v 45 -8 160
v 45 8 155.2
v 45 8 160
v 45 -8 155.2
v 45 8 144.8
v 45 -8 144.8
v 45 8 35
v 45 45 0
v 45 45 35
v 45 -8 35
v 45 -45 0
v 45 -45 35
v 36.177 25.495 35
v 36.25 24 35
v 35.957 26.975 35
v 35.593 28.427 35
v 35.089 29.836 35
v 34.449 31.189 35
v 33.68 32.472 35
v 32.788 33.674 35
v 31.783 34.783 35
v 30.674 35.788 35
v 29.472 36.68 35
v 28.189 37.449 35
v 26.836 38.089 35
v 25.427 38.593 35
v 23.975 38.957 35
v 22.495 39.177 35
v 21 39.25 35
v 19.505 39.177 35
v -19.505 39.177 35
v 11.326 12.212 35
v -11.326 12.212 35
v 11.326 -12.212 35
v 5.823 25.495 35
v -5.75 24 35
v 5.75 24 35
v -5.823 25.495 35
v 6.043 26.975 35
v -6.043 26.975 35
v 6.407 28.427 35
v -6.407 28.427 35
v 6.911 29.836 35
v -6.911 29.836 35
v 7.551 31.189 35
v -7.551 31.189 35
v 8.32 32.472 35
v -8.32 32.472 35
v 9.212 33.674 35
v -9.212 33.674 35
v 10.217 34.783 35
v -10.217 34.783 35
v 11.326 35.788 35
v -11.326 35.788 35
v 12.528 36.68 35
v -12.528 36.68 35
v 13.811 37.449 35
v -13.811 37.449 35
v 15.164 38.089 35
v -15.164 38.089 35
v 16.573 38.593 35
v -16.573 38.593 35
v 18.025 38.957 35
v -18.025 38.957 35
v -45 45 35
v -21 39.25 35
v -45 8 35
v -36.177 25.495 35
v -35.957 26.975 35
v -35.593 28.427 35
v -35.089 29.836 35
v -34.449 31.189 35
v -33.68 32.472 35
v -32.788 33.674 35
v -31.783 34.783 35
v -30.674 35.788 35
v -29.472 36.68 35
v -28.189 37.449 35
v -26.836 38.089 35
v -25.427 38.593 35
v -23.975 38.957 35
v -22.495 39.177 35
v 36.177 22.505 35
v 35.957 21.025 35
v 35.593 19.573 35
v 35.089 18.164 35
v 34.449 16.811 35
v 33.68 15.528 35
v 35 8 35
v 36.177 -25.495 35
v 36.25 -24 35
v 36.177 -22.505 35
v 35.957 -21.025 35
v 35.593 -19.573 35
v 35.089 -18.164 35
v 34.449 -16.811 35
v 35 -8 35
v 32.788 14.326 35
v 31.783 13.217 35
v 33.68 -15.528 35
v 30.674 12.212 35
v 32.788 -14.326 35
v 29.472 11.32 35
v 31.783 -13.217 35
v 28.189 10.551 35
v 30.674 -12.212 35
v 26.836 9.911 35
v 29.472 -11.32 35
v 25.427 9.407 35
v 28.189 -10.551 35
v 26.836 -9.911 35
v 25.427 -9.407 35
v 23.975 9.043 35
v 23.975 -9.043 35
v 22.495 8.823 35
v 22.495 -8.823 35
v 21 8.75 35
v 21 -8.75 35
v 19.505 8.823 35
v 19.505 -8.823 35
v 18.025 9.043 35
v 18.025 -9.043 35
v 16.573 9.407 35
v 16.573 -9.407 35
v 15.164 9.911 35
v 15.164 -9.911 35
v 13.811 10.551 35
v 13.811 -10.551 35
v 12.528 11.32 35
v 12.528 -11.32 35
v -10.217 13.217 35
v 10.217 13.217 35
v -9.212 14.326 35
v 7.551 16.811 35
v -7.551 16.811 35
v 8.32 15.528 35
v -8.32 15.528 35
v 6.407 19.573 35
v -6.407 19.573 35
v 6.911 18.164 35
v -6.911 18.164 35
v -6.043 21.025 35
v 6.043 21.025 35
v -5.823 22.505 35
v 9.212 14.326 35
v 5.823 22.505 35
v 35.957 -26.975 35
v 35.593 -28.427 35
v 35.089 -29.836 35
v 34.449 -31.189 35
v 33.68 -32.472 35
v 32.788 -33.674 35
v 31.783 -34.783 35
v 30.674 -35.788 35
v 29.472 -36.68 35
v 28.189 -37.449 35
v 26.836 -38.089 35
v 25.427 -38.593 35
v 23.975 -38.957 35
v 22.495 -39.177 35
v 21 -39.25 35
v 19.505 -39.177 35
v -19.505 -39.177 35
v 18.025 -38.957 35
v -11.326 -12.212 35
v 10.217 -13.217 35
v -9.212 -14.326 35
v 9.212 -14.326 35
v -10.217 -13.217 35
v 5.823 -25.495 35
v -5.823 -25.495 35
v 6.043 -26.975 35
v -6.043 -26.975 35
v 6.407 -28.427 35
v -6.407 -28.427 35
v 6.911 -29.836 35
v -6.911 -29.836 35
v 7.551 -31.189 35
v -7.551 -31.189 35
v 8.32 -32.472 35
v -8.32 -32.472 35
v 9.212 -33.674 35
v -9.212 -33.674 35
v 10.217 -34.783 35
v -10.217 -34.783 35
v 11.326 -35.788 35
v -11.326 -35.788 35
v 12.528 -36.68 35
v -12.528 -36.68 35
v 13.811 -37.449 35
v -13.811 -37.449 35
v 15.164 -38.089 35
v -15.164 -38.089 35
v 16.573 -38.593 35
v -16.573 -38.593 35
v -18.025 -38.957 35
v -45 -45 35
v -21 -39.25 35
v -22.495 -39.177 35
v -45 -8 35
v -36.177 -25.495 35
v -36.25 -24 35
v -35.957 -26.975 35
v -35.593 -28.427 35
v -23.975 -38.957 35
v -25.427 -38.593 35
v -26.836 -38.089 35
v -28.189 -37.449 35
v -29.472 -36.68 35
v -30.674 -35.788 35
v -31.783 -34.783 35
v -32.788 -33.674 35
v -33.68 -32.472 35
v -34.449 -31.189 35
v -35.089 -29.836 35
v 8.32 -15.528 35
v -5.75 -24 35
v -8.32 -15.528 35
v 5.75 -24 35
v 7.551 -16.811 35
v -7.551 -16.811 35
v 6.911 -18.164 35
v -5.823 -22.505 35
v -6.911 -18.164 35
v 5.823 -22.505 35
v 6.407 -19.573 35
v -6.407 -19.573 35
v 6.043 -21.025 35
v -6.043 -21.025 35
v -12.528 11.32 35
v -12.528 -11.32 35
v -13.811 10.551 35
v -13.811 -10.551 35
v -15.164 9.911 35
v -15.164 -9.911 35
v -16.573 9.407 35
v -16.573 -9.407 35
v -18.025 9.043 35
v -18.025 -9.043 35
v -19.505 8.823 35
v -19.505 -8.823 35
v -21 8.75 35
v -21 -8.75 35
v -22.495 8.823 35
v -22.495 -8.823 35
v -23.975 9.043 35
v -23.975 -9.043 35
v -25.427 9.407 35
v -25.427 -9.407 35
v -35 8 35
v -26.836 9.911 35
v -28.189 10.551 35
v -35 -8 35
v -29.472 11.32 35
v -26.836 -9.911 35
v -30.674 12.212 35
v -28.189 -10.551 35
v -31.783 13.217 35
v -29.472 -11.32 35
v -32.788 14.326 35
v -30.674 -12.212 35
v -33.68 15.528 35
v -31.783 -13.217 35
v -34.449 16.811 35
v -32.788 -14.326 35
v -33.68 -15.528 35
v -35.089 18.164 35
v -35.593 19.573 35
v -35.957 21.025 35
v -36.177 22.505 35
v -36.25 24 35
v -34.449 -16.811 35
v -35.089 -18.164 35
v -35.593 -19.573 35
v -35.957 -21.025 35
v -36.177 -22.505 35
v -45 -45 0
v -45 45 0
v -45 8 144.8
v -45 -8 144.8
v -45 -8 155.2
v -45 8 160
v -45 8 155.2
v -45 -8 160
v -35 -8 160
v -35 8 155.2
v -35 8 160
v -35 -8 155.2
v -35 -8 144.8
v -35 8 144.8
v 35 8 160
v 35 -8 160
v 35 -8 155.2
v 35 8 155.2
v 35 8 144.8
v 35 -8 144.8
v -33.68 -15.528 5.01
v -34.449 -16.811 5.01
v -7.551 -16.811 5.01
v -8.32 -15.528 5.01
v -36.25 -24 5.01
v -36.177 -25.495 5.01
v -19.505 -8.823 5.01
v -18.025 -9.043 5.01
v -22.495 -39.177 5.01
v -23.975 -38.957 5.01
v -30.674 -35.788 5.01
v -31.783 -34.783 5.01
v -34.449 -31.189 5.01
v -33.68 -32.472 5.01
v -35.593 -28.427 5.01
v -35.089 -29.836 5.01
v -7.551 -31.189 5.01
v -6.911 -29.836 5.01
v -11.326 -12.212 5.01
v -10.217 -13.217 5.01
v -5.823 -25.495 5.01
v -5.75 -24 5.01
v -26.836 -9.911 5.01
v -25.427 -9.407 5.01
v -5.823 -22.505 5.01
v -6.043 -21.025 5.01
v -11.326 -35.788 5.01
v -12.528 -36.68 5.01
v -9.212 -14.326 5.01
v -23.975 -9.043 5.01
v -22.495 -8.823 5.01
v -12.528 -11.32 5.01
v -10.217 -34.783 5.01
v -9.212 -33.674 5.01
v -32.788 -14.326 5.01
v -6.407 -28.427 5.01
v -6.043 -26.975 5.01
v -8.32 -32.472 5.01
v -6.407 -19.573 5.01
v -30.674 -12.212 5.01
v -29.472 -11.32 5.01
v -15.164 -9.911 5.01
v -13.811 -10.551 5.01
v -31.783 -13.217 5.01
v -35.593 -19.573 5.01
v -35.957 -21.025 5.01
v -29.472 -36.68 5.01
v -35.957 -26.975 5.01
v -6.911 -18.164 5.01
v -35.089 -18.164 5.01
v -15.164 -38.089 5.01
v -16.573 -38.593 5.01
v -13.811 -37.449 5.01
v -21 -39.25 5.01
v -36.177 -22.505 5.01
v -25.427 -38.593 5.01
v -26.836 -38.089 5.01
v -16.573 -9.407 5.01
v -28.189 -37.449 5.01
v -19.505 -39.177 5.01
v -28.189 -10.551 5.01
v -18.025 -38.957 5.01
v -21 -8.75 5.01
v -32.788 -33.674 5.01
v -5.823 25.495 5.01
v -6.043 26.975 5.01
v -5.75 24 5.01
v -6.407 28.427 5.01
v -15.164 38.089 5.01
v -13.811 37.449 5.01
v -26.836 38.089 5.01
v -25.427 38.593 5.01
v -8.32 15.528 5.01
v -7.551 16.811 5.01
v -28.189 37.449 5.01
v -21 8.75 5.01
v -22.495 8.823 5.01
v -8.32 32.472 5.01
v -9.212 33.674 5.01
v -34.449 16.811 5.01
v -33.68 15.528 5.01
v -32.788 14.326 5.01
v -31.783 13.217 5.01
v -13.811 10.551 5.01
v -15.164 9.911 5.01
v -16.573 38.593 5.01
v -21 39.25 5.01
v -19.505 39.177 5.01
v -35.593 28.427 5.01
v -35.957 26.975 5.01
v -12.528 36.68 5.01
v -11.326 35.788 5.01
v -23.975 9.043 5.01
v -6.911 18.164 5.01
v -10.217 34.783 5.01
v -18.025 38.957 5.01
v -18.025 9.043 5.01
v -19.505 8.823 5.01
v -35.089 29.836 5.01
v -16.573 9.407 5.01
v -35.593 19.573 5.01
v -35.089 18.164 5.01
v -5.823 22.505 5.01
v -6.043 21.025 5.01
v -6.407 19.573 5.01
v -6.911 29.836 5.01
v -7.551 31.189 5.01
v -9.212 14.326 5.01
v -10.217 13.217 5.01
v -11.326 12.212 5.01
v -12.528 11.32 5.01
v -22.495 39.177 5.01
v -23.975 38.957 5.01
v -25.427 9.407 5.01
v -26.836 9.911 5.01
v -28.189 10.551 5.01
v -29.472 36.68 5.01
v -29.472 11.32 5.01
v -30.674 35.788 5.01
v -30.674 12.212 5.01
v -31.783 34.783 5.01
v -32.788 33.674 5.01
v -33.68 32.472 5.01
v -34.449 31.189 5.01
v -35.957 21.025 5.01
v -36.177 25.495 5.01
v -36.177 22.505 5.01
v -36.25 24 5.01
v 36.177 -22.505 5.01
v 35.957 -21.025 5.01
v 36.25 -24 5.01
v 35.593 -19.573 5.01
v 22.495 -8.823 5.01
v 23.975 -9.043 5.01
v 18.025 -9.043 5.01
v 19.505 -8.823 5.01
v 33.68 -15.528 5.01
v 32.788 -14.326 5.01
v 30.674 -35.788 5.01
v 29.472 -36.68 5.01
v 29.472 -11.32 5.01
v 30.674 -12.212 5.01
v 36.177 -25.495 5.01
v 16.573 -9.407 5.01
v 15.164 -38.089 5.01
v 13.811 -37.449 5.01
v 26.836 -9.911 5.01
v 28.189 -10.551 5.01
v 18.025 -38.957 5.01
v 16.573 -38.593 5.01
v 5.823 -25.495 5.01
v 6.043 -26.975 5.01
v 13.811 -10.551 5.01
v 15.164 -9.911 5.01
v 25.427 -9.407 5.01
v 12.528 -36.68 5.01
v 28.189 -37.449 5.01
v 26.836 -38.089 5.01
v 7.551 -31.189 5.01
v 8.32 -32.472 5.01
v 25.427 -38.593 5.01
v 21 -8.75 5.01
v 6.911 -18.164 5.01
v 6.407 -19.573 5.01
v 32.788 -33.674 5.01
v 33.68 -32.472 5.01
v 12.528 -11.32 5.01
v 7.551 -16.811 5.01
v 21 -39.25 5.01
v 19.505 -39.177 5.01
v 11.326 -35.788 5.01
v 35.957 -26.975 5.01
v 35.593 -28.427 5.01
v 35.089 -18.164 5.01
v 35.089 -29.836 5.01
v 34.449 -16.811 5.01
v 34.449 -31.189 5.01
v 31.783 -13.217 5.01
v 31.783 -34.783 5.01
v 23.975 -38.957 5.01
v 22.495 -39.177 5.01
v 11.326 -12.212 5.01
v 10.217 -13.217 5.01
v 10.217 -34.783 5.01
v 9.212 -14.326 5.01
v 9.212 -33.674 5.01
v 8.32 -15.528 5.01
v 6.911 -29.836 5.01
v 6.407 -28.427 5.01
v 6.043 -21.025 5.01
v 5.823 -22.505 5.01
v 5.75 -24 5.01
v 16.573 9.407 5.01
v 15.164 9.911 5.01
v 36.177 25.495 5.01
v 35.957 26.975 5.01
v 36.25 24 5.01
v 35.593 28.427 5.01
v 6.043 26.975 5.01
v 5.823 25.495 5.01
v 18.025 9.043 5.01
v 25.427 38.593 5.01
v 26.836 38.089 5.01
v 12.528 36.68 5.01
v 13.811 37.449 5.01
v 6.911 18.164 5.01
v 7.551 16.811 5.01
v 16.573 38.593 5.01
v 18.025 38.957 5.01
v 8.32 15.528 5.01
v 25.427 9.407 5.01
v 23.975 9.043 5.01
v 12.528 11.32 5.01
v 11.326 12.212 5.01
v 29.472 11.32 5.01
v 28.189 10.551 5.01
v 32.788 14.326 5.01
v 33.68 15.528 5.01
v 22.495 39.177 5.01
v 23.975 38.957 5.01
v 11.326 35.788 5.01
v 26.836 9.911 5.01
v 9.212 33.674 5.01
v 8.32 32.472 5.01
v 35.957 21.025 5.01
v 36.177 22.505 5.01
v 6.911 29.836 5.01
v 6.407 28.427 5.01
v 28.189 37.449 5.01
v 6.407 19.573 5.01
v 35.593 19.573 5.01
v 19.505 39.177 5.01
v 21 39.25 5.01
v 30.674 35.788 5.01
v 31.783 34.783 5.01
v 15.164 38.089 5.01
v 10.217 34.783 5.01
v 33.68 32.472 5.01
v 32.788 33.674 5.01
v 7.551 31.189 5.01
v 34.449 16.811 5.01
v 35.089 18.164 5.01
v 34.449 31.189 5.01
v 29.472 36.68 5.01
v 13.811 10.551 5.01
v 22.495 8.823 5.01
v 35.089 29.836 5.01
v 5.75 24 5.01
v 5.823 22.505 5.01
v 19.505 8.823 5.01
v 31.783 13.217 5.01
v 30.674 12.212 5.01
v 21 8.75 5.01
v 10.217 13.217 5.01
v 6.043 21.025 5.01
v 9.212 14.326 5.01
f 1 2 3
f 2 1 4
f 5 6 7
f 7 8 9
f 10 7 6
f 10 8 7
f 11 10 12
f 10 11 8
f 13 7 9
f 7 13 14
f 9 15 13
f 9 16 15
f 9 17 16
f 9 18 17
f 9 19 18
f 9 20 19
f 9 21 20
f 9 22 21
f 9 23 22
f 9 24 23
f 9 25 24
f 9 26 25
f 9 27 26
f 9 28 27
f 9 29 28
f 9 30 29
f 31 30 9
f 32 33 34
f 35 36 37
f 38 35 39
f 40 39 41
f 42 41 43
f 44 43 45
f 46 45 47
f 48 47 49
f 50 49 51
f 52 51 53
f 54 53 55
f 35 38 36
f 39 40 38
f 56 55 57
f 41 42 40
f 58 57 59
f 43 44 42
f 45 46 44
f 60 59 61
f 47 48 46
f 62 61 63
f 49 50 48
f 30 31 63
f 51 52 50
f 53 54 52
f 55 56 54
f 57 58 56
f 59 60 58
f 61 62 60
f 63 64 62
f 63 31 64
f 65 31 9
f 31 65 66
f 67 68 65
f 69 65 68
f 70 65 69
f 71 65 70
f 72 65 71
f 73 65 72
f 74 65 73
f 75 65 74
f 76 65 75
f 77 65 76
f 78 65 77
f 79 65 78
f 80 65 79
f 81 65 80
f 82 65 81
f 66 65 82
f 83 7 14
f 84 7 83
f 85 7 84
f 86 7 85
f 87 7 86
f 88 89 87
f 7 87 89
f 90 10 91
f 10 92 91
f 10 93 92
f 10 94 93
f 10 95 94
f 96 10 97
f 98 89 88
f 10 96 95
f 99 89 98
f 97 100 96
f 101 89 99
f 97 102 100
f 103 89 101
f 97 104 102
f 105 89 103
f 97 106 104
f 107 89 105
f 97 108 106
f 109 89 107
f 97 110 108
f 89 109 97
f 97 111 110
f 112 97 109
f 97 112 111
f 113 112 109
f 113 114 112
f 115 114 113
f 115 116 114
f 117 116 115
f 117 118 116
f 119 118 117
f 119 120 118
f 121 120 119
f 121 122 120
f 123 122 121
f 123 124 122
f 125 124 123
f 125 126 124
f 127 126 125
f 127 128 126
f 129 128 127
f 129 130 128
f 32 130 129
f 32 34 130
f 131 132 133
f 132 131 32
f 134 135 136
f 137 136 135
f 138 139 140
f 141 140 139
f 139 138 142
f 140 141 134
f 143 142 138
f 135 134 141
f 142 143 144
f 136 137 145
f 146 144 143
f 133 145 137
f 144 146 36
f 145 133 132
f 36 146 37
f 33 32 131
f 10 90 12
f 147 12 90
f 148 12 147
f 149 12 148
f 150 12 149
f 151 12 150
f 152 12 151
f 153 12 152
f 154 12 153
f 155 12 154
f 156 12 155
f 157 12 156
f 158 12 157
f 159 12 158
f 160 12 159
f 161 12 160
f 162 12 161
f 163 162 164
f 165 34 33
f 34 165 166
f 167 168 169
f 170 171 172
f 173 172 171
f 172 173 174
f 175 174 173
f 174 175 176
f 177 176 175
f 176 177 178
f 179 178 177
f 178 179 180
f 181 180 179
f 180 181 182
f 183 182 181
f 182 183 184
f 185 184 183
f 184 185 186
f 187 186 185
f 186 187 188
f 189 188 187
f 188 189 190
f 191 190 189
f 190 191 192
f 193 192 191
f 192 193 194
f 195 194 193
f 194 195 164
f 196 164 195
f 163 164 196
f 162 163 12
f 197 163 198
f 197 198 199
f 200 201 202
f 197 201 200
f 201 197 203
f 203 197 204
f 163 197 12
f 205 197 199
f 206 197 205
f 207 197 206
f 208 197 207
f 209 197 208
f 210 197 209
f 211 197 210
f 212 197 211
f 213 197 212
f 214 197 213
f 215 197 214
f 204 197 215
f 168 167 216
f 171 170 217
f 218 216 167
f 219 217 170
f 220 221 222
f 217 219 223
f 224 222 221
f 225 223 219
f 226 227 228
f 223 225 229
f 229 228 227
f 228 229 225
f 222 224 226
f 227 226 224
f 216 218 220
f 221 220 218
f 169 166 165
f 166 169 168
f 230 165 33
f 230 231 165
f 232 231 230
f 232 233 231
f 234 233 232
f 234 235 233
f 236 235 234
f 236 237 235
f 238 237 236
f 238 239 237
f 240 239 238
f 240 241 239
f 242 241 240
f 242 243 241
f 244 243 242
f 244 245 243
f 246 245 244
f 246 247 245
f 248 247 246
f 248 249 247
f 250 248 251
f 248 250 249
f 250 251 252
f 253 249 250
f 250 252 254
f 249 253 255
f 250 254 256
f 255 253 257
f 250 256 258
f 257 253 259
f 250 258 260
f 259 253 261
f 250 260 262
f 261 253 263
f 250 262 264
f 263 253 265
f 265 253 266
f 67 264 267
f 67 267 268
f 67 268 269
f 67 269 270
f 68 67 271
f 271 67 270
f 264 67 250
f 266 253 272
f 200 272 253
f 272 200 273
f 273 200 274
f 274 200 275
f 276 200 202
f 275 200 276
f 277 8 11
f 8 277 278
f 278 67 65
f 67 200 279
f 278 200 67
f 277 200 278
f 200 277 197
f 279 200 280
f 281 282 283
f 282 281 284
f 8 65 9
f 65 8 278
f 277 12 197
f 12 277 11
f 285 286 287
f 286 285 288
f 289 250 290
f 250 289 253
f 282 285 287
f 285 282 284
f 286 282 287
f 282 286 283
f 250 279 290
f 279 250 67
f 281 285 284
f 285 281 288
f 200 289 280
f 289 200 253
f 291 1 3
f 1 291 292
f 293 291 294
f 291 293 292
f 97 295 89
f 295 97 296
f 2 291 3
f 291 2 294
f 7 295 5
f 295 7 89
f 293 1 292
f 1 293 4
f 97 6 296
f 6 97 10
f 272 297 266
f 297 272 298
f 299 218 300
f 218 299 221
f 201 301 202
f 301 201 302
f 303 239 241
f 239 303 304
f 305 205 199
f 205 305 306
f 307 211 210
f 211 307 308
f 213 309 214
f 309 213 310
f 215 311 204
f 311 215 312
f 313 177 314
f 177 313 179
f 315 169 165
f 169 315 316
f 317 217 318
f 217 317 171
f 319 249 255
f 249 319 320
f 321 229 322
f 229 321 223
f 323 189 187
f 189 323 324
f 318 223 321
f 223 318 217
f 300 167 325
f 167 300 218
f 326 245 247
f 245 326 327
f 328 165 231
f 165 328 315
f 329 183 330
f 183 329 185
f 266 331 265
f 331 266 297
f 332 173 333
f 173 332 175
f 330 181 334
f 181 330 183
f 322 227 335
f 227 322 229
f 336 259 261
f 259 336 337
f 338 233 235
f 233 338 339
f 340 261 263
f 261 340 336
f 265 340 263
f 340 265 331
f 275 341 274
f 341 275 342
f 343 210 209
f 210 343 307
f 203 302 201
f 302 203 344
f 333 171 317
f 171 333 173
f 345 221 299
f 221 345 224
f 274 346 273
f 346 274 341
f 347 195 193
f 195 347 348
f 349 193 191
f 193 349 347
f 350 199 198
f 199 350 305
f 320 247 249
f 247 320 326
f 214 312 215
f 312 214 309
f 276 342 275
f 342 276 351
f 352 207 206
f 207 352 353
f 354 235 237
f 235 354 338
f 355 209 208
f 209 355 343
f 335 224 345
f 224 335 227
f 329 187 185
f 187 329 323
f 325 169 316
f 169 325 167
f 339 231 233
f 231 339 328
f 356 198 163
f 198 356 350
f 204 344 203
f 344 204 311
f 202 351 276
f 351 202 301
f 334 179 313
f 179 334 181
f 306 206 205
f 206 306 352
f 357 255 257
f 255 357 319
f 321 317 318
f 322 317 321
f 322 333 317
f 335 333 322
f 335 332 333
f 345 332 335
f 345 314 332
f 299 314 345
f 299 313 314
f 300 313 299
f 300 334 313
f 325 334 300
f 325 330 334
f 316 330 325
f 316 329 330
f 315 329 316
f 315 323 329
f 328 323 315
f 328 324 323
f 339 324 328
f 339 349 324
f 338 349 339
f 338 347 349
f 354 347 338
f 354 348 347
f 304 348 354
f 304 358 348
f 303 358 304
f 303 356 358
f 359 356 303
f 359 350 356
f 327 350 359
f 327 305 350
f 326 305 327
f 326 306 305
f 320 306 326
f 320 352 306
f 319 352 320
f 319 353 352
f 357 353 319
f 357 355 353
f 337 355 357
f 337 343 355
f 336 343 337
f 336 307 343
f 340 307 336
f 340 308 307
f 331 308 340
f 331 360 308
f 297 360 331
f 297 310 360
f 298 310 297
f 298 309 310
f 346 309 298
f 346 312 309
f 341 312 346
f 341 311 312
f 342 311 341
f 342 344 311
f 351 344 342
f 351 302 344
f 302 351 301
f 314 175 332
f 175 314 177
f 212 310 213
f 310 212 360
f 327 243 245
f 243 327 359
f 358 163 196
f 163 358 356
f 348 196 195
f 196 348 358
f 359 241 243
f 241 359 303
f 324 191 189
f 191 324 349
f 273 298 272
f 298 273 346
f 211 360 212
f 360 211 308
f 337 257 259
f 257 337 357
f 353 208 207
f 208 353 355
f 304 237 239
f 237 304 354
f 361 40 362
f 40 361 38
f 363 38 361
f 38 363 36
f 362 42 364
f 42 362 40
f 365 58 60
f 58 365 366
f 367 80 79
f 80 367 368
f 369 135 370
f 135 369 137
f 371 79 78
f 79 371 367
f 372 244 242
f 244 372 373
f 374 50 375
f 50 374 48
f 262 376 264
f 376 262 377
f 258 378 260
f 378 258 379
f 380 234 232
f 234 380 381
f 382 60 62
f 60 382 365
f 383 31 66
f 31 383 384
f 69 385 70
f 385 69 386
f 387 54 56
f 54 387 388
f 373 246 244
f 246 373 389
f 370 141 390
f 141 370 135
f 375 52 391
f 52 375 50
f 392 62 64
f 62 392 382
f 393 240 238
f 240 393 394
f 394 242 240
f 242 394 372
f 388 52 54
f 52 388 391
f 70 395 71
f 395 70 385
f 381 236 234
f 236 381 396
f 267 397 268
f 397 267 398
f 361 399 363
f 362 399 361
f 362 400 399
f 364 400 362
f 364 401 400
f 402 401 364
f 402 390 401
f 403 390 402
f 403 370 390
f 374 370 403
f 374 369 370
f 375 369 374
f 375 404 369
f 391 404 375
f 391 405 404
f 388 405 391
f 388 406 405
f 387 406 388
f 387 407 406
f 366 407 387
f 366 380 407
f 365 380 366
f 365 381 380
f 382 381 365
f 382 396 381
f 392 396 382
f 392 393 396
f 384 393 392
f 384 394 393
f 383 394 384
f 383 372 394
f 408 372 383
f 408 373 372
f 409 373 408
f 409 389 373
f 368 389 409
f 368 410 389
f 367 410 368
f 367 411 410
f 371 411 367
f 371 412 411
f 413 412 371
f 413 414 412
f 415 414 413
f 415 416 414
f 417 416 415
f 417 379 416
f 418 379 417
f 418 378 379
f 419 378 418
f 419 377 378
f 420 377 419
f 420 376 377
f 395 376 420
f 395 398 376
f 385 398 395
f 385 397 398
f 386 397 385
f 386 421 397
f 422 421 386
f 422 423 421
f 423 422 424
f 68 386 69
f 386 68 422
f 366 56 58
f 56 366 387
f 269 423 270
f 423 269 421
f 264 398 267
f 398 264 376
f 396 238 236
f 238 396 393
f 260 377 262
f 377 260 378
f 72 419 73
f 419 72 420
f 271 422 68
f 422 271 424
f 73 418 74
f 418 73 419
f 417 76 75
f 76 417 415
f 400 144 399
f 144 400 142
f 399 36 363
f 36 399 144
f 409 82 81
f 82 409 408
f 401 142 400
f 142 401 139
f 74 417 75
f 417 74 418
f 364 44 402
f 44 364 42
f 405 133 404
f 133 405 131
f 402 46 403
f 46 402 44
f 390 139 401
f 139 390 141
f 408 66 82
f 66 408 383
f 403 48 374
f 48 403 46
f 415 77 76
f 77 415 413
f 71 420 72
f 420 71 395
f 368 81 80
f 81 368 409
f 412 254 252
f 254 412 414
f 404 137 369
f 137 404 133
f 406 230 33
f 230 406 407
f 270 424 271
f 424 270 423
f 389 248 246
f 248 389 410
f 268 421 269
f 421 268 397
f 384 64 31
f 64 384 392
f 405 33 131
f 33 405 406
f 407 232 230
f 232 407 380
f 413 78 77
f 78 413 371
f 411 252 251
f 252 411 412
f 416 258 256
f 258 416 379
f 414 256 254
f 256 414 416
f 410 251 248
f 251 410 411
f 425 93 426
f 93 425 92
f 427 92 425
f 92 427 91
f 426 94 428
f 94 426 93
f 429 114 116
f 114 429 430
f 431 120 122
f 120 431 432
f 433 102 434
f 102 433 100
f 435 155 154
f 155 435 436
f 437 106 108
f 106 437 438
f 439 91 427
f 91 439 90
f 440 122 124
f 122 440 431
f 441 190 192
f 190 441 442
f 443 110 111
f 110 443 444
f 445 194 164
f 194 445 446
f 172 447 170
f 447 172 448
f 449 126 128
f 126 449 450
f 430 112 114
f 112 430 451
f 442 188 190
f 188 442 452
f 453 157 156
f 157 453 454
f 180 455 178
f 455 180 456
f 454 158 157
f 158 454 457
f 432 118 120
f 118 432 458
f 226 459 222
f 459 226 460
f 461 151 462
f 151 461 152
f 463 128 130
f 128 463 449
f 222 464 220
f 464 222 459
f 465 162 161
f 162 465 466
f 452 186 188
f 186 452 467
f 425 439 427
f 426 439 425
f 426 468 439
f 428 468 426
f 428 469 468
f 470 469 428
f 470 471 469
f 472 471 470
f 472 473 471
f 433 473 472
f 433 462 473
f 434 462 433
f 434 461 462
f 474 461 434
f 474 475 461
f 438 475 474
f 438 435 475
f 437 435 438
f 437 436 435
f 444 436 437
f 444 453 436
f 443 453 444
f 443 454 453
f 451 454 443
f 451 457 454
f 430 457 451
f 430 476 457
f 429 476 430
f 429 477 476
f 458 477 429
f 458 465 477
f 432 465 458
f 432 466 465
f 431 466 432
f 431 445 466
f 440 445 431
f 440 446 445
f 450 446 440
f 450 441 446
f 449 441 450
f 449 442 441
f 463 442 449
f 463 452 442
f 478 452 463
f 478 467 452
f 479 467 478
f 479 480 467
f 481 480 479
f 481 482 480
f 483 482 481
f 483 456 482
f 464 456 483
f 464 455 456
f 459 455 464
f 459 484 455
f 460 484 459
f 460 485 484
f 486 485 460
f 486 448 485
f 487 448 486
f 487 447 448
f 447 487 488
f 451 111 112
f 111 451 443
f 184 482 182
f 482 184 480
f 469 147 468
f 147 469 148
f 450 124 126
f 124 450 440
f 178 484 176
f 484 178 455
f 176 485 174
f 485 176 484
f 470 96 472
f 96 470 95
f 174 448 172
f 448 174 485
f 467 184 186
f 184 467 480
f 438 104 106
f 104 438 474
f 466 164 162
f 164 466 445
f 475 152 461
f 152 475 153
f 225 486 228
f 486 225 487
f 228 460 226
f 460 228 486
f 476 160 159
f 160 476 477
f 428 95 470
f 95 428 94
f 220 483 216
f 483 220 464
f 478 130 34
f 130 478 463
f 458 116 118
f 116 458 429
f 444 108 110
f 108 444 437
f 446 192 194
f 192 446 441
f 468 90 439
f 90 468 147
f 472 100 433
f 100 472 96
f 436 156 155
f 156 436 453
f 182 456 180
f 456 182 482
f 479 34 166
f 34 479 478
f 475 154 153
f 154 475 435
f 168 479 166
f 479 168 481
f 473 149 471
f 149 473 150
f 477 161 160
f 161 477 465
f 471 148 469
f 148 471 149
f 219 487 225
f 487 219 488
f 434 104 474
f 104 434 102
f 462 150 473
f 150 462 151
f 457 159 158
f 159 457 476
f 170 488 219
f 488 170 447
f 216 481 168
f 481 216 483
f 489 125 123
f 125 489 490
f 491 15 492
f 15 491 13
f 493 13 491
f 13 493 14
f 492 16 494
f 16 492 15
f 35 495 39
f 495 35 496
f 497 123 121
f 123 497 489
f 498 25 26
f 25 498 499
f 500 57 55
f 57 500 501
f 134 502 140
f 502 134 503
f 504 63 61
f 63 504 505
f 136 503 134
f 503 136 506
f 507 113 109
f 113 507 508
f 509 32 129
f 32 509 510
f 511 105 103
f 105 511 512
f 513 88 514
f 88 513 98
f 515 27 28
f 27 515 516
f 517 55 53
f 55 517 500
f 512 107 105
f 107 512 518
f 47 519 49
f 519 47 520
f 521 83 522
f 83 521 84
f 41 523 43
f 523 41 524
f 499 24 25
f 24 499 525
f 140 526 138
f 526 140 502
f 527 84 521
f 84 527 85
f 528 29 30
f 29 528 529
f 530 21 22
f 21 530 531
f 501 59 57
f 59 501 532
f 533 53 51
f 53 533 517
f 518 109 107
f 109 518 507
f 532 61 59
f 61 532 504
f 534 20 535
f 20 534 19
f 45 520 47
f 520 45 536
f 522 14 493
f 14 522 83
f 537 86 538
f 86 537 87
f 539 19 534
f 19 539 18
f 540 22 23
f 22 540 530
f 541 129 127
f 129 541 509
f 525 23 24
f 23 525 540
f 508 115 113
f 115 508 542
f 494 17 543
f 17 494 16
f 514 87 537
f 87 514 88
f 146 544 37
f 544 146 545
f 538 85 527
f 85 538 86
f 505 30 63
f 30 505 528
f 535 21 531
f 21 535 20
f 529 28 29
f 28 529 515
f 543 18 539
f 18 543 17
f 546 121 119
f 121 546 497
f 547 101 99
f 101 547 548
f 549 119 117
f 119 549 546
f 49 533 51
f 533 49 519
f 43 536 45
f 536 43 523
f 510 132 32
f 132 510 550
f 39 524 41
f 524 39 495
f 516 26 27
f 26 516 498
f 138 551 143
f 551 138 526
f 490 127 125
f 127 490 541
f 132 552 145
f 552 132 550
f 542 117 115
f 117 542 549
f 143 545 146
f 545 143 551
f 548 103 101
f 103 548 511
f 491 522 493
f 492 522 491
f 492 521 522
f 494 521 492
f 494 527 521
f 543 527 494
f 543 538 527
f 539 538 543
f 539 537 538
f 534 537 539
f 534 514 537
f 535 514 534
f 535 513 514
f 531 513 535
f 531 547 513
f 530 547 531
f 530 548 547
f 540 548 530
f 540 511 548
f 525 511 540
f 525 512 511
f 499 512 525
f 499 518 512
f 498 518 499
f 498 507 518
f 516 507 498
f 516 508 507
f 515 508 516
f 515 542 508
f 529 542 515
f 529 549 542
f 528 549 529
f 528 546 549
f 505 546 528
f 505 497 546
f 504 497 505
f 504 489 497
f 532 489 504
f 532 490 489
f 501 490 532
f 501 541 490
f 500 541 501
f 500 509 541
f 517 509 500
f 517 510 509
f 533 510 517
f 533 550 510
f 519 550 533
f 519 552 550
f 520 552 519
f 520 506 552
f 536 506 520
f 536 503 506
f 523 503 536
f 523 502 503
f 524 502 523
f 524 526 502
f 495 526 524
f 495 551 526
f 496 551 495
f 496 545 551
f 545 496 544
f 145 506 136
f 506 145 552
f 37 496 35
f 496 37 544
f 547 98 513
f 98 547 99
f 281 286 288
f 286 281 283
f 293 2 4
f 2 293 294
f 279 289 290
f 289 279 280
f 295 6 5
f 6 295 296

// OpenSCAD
// Part 1: Base Block with tube seats and posts
// Part 2: Handle Bar

// --- Dimensions Part 1 ---
base_x      = 90.0;    // Base length (X)
base_y      = 90.0;    // Base width (Y)
base_z      = 35.0;    // Base height (Z)

seat_d      = 30.5;    // Diameter of tube seats
seat_depth  = 30.0;    // Depth of tube seats
seat_floor  = 5.0;     // Remaining floor thickness

seat_x_pos  = 21.0;    // X offset for seats
seat_y_pos  = 24.0;    // Y offset for seats

post_x_thick = 10.0;   // Thickness of posts (X direction)
post_y_wide  = 16.0;   // Width of posts (Y direction)
post_z_high  = 160.0;  // Total height of posts (Z)

hole_size   = 10.4;    // Square hole size (X-axis through posts)
hole_z_pos  = 150.0;   // Z height of the hole center

// --- Dimensions Part 2 ---
handle_x    = 100.0;   // Length of handle (X)
handle_y    = 10.0;    // Width of handle (Y)
handle_z    = 10.0;    // Height of handle (Z)
handle_y_gap = 10.0;   // Gap between base +Y face and handle (Y direction)

// Calculated positions
// Base +Y face is at Y = 45. Handle spans Y = 55 to 65.
handle_y_start = (base_y / 2) + handle_y_gap;
handle_y_end   = handle_y_start + handle_y;

$fn = 64;

// --- MODULE: PART 1 ---
module part_1() {
    difference() {
        union() {
            // Main Base Block
            translate([-base_x/2, -base_y/2, 0])
                cube([base_x, base_y, base_z]);
            
            // Post 1 (at -X end)
            translate([-base_x/2, -post_y_wide/2, base_z])
                cube([post_x_thick, post_y_wide, post_z_high - base_z]);
            
            // Post 2 (at +X end)
            translate([base_x/2 - post_x_thick, -post_y_wide/2, base_z])
                cube([post_x_thick, post_y_wide, post_z_high - base_z]);
        }

        // Tube Seats (Blind holes)
        // Seats are centered at x = +/- 21, y = +/- 24
        // We use a loop to define the 4 positions
        for (sx = [-seat_x_pos, seat_x_pos]) {
            for (sy = [-seat_y_pos, seat_y_pos]) {
                translate([sx, sy, base_z - seat_depth + 0.01])
                    cylinder(h = seat_depth, d = seat_d);
            }
        }

        // Square holes through posts
        // Hole is centered at z = 150. 
        // Post 1 is at X = [-45, -35]. Post 2 is at X = [35, 45].
        // We cut through the whole block width to ensure clean holes.
        translate([-base_x/2 - 1, -post_y_wide/2 - 1, hole_z_pos - hole_size/2])
            cube([base_x + 2, post_y_wide + 2, hole_size]);
    }
}

// --- MODULE: PART 2 ---
module part_2() {
    // Handle is a square bar 10x10, 100 long, centered on X.
    // It spans Y from 55 to 65.
    // In OpenSCAD, to center on X, we use -50 to 50.
    // To place Y from 55 to 65, we translate by (55 - 90/2) = 10.
    // Wait, the prompt says "10mm gap to the base's +Y face".
    // Base +Y face is at 45. So handle Y starts at 45 + 10 = 55.
    // Handle Y center is 60.
    
    translate([-handle_x/2, handle_y_start, 0])
        cube([handle_x, handle_y, handle_z]);
}

// --- RENDERING ---
// To view Part 1:
part_1();

// To view Part 2 (uncomment below and comment part_1 above to see separately):
// translate([0, 100, 0]) part_2();
